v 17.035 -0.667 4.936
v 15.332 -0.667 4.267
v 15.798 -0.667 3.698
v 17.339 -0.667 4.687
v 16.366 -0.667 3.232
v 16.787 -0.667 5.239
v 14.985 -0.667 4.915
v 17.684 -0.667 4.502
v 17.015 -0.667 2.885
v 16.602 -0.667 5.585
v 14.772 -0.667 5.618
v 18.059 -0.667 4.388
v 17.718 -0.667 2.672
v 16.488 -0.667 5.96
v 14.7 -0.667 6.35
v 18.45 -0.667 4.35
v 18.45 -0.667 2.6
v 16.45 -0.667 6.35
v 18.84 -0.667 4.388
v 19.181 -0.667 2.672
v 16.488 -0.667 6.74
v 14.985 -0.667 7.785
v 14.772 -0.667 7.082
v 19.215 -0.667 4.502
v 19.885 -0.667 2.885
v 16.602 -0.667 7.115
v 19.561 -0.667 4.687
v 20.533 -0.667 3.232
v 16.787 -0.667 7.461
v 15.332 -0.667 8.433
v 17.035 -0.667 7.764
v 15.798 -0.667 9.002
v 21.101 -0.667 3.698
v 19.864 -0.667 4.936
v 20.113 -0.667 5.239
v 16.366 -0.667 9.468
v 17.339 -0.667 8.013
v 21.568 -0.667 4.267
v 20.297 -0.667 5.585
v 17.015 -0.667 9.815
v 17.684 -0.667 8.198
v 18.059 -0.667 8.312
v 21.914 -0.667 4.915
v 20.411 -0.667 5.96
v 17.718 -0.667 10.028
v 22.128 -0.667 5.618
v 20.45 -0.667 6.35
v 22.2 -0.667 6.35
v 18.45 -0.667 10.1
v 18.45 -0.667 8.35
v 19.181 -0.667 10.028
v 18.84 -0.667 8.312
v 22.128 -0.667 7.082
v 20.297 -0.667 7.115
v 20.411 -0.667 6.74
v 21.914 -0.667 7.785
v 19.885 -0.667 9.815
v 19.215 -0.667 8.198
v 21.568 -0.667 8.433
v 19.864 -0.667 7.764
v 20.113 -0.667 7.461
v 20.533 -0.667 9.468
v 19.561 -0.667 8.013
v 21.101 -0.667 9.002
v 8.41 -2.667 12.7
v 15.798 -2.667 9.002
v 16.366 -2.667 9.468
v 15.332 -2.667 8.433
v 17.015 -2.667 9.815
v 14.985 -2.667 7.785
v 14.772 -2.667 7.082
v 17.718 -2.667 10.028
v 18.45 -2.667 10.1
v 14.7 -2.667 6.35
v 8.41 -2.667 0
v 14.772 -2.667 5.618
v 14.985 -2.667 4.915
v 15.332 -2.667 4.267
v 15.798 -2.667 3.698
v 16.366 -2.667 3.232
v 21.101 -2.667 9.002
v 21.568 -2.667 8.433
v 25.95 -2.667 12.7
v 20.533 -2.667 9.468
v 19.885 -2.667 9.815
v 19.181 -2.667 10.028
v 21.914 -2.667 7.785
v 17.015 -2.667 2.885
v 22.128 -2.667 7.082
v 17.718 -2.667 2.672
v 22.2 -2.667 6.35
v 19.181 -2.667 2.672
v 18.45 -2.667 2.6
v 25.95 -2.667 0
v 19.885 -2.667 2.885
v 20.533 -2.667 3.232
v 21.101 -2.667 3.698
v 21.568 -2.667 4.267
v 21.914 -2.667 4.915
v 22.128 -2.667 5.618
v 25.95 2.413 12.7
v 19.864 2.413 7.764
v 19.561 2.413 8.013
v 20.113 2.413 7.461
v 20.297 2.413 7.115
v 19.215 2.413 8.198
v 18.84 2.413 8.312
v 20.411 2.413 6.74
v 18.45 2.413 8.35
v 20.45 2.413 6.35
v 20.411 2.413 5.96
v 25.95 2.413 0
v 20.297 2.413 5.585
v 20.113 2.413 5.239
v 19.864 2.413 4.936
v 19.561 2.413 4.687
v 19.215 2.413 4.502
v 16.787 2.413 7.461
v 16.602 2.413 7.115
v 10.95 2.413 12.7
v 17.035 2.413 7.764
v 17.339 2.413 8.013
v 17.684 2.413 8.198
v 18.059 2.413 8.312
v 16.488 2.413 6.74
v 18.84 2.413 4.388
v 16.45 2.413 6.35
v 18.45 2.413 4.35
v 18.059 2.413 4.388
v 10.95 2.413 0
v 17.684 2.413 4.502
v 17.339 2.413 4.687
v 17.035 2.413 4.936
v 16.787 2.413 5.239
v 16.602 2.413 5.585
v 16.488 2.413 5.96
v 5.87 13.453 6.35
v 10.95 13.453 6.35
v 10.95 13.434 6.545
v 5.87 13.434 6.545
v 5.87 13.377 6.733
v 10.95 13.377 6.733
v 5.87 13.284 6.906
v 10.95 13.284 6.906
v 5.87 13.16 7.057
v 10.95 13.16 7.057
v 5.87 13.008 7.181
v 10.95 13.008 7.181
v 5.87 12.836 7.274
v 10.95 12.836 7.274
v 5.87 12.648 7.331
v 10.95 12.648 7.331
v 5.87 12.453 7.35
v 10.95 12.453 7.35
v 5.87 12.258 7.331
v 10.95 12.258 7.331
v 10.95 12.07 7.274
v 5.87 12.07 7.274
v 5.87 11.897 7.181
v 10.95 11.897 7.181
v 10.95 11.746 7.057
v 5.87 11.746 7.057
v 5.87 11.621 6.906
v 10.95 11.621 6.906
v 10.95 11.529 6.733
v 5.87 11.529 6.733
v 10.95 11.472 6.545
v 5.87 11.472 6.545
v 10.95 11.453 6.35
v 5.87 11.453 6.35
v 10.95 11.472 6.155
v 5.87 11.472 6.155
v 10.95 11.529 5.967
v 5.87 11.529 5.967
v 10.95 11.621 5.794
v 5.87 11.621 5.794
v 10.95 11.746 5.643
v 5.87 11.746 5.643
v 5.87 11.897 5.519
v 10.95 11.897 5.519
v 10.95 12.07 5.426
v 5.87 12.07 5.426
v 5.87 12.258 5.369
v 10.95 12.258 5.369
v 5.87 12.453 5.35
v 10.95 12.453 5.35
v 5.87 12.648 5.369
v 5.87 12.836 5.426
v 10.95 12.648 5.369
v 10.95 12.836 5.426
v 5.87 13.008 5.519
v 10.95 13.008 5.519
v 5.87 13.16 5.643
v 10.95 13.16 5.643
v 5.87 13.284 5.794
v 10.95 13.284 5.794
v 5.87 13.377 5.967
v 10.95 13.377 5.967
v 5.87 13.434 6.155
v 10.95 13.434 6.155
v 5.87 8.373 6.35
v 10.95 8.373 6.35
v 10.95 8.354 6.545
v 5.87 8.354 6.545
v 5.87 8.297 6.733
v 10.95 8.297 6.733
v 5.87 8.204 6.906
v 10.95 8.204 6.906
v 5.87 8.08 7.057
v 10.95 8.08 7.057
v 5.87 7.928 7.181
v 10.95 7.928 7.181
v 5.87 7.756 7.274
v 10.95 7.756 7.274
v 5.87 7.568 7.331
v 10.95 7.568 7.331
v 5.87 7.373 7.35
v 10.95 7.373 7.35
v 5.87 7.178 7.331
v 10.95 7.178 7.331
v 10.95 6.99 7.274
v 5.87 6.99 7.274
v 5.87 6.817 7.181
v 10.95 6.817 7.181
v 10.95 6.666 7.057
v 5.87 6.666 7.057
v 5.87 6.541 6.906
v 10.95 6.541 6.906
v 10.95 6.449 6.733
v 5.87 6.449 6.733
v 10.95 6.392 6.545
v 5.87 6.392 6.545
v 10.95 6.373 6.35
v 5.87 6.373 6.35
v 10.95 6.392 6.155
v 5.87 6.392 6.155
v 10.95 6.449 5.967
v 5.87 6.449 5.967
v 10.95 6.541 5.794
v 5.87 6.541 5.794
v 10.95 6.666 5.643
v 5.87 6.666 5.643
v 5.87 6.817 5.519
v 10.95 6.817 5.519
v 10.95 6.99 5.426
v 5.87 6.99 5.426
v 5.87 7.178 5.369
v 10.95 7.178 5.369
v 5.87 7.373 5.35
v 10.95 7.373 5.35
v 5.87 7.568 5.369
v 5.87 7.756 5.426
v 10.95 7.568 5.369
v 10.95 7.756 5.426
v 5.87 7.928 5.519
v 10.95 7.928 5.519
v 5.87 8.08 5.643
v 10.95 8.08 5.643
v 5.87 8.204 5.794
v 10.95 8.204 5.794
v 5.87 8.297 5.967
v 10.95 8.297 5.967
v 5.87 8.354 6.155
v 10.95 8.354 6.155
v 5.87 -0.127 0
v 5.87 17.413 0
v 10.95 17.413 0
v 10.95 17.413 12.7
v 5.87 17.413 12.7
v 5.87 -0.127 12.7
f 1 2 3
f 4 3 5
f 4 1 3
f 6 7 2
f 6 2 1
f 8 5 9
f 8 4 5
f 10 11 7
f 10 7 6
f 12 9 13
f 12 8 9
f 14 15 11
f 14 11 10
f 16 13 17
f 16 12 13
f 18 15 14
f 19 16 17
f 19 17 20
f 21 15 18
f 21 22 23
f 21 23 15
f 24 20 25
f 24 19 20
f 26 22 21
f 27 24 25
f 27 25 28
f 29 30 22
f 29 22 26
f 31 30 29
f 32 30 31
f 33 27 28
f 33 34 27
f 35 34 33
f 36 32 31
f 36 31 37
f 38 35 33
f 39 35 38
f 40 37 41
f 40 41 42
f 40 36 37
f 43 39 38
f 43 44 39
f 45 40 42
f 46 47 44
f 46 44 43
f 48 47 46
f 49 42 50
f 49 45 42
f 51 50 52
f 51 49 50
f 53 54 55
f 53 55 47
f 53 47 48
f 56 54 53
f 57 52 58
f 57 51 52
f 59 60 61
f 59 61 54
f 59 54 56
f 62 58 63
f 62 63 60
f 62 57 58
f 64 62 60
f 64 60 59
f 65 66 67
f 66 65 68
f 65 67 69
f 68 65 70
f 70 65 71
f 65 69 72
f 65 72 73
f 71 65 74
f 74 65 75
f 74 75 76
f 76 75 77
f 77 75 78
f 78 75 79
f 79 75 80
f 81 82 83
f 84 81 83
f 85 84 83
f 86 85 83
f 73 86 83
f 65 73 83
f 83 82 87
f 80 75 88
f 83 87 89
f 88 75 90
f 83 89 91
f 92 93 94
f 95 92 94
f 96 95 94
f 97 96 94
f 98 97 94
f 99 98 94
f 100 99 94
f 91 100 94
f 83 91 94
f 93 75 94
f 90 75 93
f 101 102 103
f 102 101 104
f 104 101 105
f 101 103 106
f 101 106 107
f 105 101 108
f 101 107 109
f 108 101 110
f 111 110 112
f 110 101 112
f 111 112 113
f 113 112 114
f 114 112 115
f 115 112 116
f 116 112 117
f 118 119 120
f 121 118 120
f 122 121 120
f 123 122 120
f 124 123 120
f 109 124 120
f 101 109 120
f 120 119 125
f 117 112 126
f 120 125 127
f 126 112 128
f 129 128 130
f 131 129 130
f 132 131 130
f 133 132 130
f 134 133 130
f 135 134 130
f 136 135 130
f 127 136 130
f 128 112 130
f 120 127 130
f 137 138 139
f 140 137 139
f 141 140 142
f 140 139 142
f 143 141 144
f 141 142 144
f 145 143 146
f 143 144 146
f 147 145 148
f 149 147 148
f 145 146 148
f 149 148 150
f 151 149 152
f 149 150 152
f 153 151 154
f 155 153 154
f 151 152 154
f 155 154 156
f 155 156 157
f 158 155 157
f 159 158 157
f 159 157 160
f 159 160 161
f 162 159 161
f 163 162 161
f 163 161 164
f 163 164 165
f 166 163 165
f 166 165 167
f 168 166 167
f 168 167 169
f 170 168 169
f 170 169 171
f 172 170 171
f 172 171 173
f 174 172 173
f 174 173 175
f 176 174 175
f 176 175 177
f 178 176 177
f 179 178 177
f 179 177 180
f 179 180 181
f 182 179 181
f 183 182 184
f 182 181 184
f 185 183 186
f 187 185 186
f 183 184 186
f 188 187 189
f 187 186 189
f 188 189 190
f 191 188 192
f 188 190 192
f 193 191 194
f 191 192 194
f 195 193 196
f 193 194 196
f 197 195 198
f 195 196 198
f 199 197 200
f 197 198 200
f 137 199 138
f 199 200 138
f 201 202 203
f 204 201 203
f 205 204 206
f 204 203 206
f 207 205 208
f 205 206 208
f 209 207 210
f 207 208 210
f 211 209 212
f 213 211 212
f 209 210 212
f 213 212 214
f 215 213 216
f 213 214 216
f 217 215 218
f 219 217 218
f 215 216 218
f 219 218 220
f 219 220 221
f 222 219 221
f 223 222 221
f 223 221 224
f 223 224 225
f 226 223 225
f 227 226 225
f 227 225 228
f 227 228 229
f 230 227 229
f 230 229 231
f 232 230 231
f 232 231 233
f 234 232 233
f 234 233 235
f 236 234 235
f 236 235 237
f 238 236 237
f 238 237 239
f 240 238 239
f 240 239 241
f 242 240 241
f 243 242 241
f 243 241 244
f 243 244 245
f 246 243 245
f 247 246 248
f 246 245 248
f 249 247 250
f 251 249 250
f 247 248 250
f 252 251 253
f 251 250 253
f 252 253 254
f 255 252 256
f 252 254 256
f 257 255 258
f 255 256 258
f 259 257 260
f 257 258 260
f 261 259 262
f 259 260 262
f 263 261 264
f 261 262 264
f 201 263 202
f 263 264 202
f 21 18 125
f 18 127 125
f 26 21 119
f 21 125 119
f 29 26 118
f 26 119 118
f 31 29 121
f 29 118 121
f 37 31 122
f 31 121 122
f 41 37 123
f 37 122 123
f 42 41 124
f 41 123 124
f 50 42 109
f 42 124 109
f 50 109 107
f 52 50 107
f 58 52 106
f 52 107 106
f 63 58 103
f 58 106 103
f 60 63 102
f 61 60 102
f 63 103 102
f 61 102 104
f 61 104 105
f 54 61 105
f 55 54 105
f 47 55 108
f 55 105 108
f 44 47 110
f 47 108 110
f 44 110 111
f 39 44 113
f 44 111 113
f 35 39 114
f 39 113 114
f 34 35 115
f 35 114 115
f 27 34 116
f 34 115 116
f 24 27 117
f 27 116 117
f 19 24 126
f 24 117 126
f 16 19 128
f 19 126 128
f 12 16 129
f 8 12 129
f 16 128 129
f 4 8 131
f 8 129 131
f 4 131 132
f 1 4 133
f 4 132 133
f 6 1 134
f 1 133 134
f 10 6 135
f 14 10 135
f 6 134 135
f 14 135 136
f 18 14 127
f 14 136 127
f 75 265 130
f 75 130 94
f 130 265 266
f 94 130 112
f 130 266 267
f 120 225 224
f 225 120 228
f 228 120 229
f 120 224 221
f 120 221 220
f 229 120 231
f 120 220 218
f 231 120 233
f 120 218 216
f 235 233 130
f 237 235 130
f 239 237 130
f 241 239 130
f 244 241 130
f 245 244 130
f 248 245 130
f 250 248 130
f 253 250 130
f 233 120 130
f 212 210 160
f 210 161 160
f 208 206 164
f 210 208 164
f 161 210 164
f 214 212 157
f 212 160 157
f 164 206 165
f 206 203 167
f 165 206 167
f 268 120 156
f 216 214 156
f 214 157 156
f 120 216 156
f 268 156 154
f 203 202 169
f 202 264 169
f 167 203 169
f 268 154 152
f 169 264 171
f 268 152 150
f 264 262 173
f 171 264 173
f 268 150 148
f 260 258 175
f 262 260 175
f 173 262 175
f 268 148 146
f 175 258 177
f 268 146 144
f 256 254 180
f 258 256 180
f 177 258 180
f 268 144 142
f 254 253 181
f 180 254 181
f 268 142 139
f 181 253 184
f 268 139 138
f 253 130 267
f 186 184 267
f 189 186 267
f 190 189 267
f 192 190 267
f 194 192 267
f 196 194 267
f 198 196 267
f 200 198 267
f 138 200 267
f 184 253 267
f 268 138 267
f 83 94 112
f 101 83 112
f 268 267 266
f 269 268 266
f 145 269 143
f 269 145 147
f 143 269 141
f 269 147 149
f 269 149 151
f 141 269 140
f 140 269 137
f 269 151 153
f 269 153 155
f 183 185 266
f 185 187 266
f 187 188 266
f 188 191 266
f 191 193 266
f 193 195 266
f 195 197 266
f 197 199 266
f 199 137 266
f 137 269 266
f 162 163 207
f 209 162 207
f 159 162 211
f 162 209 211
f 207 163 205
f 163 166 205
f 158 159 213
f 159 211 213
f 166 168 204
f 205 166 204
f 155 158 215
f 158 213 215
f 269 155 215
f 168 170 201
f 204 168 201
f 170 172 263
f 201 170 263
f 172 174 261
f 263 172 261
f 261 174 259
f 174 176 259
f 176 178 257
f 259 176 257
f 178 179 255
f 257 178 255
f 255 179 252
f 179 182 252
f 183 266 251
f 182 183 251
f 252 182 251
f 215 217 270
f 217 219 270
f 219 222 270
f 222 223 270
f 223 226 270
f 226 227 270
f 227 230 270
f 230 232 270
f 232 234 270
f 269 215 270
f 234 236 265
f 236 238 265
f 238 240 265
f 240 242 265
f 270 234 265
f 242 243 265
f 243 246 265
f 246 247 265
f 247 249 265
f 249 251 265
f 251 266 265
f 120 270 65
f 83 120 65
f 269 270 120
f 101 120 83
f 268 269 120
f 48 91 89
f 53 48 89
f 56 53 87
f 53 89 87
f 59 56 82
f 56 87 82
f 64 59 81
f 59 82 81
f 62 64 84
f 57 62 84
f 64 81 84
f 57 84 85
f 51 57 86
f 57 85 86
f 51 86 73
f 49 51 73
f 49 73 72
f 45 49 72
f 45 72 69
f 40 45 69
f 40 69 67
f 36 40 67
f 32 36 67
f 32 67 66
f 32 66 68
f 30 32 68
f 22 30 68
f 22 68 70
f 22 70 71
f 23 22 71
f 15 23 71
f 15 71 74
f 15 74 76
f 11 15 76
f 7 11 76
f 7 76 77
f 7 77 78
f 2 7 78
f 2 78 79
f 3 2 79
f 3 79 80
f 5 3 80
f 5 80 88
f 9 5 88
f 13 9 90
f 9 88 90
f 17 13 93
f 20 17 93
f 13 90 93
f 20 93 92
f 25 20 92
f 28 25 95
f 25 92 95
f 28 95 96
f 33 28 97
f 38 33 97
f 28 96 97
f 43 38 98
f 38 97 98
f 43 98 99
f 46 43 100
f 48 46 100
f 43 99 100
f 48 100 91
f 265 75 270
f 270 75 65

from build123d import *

# Parameters (mm, degrees)
F1_DEPTH       = 12.7
F3_D           = 4
F3_DEPTH       = 12.7
F3_CBORE_D     = 7.5
F3_CBORE_DEPTH = 2
F4_SIZE        = 2.54
F6_D           = 2


with BuildPart() as f1:
    # F0 (on Top) → F1 (new body)
    with BuildSketch(Plane.XY):
        Polygon((10.949644, 17.412821), (5.869644, 17.412821), (5.869644, -2.667179), (25.949644, -2.667179), (25.949644, 2.412821), (10.949644, 2.412821), align=None)
    extrude(amount=F1_DEPTH)

    # F3
    with Locations(Plane.XZ.offset(2.667179)):
        with Locations((18.449644, 6.35)):
            CounterBoreHole(F3_D / 2, F3_CBORE_D / 2, F3_CBORE_DEPTH, depth=F3_DEPTH)

    # F4
    f4_edges = [f1.edges().sort_by_distance(p)[0] for p in [
        (5.869644, -2.667179, 6.35),
    ]]
    chamfer(f4_edges, length=F4_SIZE)

    # F6 (through all)
    with Locations(Plane(origin=(5.869644, 0, 0), x_dir=(0, -1, 0), z_dir=(-1, 0, 0))):
        with Locations((-7.372821, 6.35), (-12.452821, 6.35)):
            Hole(F6_D / 2)


solid = f1.part
